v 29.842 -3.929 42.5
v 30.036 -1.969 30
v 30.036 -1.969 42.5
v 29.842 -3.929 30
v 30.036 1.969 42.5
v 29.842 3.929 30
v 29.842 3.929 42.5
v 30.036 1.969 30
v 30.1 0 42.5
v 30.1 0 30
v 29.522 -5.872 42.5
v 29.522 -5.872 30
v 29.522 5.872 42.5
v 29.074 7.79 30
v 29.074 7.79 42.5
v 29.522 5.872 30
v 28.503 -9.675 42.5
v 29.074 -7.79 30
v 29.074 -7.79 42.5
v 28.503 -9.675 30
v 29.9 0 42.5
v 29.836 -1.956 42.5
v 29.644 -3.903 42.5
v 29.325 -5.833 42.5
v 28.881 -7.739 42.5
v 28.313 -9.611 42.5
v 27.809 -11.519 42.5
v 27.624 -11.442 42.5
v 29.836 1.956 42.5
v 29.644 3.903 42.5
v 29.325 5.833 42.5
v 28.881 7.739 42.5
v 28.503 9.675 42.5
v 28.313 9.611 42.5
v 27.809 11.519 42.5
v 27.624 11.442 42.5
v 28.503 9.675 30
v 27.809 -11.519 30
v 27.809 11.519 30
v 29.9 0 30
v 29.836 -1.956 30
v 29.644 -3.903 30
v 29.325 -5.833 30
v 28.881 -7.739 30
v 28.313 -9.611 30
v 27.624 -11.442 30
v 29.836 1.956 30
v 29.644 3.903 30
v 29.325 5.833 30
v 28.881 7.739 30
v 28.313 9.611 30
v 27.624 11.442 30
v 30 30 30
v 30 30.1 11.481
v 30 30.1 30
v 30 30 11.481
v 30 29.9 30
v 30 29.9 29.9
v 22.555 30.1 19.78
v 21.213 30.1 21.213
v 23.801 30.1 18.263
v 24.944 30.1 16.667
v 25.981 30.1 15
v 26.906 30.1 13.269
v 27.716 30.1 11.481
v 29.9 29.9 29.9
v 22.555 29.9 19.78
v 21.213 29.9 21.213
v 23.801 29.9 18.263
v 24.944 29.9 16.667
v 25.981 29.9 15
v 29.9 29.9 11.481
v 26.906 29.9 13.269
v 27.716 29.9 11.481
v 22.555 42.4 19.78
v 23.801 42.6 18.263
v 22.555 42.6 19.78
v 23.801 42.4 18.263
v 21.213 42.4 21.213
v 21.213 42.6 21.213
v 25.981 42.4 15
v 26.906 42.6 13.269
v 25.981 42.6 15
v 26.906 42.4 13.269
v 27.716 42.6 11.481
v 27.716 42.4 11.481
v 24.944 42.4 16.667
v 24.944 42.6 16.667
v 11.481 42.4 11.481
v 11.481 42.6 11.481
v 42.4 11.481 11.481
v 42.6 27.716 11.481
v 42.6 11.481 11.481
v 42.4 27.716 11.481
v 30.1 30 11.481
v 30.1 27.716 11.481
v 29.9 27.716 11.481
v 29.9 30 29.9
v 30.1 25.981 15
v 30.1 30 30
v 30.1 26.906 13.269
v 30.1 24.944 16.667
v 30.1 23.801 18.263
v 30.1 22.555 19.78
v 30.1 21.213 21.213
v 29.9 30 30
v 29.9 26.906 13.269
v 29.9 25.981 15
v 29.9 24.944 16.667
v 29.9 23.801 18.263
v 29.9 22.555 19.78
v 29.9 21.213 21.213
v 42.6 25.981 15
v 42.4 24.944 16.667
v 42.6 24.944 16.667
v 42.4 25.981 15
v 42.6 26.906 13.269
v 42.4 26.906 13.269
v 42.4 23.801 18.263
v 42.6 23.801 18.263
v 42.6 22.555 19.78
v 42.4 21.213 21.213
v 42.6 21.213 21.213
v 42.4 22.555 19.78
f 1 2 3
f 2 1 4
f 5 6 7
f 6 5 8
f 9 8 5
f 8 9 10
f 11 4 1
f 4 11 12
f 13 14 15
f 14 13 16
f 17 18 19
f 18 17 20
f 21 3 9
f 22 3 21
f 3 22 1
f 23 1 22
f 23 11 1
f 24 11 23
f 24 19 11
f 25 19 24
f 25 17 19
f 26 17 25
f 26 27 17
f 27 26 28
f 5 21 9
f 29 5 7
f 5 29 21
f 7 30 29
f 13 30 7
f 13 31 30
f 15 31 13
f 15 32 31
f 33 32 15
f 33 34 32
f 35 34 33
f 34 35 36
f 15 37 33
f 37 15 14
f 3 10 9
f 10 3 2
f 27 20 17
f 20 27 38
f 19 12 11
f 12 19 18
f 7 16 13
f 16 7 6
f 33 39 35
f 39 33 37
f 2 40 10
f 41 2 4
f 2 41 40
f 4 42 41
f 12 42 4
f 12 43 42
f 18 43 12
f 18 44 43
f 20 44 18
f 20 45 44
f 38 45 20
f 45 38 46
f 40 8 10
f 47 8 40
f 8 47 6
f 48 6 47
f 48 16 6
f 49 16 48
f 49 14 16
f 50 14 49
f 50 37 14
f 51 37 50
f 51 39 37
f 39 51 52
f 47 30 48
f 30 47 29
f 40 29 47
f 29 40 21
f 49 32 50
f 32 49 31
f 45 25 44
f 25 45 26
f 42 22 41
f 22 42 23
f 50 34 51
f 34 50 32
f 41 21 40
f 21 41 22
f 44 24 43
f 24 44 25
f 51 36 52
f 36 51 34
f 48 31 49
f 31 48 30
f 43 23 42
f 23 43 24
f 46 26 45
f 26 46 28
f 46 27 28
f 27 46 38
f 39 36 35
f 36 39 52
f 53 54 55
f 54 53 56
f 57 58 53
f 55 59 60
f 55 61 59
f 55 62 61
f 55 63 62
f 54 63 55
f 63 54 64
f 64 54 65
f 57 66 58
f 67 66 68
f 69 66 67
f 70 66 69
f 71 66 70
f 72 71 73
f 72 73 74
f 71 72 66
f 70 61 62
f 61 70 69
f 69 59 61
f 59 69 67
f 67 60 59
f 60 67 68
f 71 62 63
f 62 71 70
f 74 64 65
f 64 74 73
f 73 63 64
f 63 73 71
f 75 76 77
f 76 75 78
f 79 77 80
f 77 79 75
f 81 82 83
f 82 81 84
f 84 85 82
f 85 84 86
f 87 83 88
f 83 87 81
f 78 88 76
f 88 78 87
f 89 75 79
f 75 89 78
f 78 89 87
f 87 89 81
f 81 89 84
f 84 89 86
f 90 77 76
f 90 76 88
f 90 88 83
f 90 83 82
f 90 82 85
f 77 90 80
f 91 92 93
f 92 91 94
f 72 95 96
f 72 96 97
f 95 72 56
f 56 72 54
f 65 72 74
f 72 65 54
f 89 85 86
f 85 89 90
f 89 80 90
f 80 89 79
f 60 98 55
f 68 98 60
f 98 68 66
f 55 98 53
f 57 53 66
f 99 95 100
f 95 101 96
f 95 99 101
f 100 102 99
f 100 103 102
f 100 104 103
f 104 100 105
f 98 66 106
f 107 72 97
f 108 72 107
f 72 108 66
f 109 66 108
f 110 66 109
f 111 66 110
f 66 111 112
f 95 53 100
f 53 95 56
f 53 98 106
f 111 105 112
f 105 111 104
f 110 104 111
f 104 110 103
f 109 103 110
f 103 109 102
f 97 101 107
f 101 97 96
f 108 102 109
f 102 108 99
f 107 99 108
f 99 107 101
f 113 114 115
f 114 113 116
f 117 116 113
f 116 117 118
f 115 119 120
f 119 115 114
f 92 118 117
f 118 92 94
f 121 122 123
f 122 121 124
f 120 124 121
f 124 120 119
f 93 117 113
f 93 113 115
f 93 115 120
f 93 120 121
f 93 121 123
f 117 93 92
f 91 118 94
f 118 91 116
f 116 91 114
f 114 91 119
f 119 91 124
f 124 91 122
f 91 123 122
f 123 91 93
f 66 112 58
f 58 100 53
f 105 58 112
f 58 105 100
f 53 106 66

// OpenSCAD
// file: def.scad
round_radius = 0.6;
sticker_margin = 1.2;
sticker_round_radius = 0.4;
cube_size = 60;
disk_height = 12.5;
disk_radius = cube_size / 2;
base_size = cube_size / 2 / sqrt(10 + 7 * sqrt(2));
cut1_dis = base_size * (1 + sqrt(2) / 2);
cut2_dis = cube_size / 2;
inf = cube_size * 10;

module _cube() {
    cube([cube_size - round_radius * 2, cube_size - round_radius * 2, cube_size - round_radius * 2], center = true);
}

module _disk() {
    translate([0, 0, cube_size / 2 + disk_height / 2])
        cylinder(r = disk_radius - round_radius, h = disk_height - round_radius * 2, center = true, $fn = 96);
}

module _int_cut1() {
    translate([-inf, -inf, cut1_dis + round_radius])
        cube([inf * 2, inf * 2, inf]);
}

module _dif_cut1() {
    translate([-inf, -inf, cut1_dis - round_radius])
        cube([inf * 2, inf * 2, inf]);
}

module _sticker_int_cut1() {
    translate([-inf, -inf, cut1_dis + sticker_margin])
        cube([inf * 2, inf * 2, inf]);
}

module _sticker_dif_cut1() {
    translate([-inf, -inf, cut1_dis - sticker_margin])
        cube([inf * 2, inf * 2, inf]);
}

module _int_cut2() {
    translate([-inf, -inf, cut2_dis + round_radius])
        cube([inf * 2, inf * 2, inf]);
}

module _dif_cut2() {
    translate([-inf, -inf, cut2_dis - round_radius])
        cube([inf * 2, inf * 2, inf]);
}

module _sticker_int_cut2() {
    translate([-inf, -inf, cut2_dis + sticker_margin])
        cube([inf * 2, inf * 2, inf]);
}

module _sticker_dif_cut2() {
    translate([-inf, -inf, cut2_dis - sticker_margin])
        cube([inf * 2, inf * 2, inf]);
}

module _sticker_cube() {
    translate([-cube_size / 2 + sticker_margin, -cube_size / 2 + sticker_margin, cube_size / 2 - 0.05])
        cube([cube_size - sticker_margin * 2, cube_size - sticker_margin * 2, 0.1]);
}

module _sticker_disk() {
    translate([0, 0, cube_size / 2 + disk_height - 0.05])
        cylinder(r = disk_radius - sticker_margin, h = 0.1, center = true, $fn = 96);
}
// file: selector_2_ccw.scad
include <def.scad>

module selector_2_ccw() {
    difference() {
        rotate([0, 90, 0]) {
            difference() {
                translate([-cube_size / 2, -cube_size / 2, cube_size / 2 - 0.1])
                    cube([cube_size, cube_size, 0.2]);
                cylinder(r = disk_radius, h = inf * 2, center = true, $fn = 96);
            }
            translate([0, 0, cube_size / 2 + disk_height])
                cylinder(r = disk_radius, h = 0.2, center = true, $fn = 96);
        }
        rotate([180, 0, 0])
            translate([-inf, -inf, -cut1_dis])
                cube([inf * 2, inf * 2, inf]);
        rotate([45, 0, 0])
            translate([-inf, -inf, 0])
                cube([inf * 2, inf * 2, inf]);
    }
}

for (deg = [0 : 90 : 270])
    rotate([0, 0, deg])
        selector_2_ccw();
// file: selector_2_cw.scad
include <def.scad>

module selector_2_cw() {
    difference() {
        rotate([-90, 0, 0]) {
            difference() {
                translate([-cube_size / 2, -cube_size / 2, cube_size / 2 - 0.1])
                    cube([cube_size, cube_size, 0.2]);
                cylinder(r = disk_radius, h = inf * 2, center = true, $fn = 96);
            }
            translate([0, 0, cube_size / 2 + disk_height])
                cylinder(r = disk_radius, h = 0.2, center = true, $fn = 96);
        }
        rotate([180, 0, 0])
            translate([-inf, -inf, -cut1_dis])
                cube([inf * 2, inf * 2, inf]);
        rotate([0, -45, 0])
            translate([-inf, -inf, 0])
                cube([inf * 2, inf * 2, inf]);
    }
}

for (deg = [0 : 90 : 270])
    rotate([0, 0, deg])
        selector_2_cw();
// file: selector_1_ccw.scad
include <def.scad>

module selector_1_ccw() {
    difference() {
        difference() {
            translate([0, 0, cube_size / 2 + disk_height / 2])
                cylinder(r = disk_radius + 0.1, h = disk_height, center = true, $fn = 96);
            cylinder(r = disk_radius - 0.1, h = inf * 2, center = true, $fn = 96);
        }
        for (deg = [0, -157.5])
        rotate([90, 0, deg])
            translate([-inf, -inf, 0])
                cube([inf * 2, inf * 2, inf]);
    }
}

for (deg = [0 : 45 : 315])
    rotate([0, 0, deg])
        selector_1_ccw();
// file: selector_1_cw.scad
include <def.scad>

module selector_1_cw() {
    difference() {
        difference() {
            translate([0, 0, cube_size / 2 + disk_height / 2])
                cylinder(r = disk_radius + 0.1, h = disk_height, center = true, $fn = 96);
            cylinder(r = disk_radius - 0.1, h = inf * 2, center = true, $fn = 96);
        }
        for (deg = [-22.5, -180])
        rotate([90, 0, deg])
            translate([-inf, -inf, 0])
                cube([inf * 2, inf * 2, inf]);
    }
}

for (deg = [0 : 45 : 315])
    rotate([0, 0, deg])
        selector_1_cw();
// main file
use <selector_1_cw.scad>
use <selector_1_ccw.scad>
use <selector_2_cw.scad>
use <selector_2_ccw.scad>

selector_1_cw();
selector_1_ccw();
selector_2_cw();
selector_2_ccw();
